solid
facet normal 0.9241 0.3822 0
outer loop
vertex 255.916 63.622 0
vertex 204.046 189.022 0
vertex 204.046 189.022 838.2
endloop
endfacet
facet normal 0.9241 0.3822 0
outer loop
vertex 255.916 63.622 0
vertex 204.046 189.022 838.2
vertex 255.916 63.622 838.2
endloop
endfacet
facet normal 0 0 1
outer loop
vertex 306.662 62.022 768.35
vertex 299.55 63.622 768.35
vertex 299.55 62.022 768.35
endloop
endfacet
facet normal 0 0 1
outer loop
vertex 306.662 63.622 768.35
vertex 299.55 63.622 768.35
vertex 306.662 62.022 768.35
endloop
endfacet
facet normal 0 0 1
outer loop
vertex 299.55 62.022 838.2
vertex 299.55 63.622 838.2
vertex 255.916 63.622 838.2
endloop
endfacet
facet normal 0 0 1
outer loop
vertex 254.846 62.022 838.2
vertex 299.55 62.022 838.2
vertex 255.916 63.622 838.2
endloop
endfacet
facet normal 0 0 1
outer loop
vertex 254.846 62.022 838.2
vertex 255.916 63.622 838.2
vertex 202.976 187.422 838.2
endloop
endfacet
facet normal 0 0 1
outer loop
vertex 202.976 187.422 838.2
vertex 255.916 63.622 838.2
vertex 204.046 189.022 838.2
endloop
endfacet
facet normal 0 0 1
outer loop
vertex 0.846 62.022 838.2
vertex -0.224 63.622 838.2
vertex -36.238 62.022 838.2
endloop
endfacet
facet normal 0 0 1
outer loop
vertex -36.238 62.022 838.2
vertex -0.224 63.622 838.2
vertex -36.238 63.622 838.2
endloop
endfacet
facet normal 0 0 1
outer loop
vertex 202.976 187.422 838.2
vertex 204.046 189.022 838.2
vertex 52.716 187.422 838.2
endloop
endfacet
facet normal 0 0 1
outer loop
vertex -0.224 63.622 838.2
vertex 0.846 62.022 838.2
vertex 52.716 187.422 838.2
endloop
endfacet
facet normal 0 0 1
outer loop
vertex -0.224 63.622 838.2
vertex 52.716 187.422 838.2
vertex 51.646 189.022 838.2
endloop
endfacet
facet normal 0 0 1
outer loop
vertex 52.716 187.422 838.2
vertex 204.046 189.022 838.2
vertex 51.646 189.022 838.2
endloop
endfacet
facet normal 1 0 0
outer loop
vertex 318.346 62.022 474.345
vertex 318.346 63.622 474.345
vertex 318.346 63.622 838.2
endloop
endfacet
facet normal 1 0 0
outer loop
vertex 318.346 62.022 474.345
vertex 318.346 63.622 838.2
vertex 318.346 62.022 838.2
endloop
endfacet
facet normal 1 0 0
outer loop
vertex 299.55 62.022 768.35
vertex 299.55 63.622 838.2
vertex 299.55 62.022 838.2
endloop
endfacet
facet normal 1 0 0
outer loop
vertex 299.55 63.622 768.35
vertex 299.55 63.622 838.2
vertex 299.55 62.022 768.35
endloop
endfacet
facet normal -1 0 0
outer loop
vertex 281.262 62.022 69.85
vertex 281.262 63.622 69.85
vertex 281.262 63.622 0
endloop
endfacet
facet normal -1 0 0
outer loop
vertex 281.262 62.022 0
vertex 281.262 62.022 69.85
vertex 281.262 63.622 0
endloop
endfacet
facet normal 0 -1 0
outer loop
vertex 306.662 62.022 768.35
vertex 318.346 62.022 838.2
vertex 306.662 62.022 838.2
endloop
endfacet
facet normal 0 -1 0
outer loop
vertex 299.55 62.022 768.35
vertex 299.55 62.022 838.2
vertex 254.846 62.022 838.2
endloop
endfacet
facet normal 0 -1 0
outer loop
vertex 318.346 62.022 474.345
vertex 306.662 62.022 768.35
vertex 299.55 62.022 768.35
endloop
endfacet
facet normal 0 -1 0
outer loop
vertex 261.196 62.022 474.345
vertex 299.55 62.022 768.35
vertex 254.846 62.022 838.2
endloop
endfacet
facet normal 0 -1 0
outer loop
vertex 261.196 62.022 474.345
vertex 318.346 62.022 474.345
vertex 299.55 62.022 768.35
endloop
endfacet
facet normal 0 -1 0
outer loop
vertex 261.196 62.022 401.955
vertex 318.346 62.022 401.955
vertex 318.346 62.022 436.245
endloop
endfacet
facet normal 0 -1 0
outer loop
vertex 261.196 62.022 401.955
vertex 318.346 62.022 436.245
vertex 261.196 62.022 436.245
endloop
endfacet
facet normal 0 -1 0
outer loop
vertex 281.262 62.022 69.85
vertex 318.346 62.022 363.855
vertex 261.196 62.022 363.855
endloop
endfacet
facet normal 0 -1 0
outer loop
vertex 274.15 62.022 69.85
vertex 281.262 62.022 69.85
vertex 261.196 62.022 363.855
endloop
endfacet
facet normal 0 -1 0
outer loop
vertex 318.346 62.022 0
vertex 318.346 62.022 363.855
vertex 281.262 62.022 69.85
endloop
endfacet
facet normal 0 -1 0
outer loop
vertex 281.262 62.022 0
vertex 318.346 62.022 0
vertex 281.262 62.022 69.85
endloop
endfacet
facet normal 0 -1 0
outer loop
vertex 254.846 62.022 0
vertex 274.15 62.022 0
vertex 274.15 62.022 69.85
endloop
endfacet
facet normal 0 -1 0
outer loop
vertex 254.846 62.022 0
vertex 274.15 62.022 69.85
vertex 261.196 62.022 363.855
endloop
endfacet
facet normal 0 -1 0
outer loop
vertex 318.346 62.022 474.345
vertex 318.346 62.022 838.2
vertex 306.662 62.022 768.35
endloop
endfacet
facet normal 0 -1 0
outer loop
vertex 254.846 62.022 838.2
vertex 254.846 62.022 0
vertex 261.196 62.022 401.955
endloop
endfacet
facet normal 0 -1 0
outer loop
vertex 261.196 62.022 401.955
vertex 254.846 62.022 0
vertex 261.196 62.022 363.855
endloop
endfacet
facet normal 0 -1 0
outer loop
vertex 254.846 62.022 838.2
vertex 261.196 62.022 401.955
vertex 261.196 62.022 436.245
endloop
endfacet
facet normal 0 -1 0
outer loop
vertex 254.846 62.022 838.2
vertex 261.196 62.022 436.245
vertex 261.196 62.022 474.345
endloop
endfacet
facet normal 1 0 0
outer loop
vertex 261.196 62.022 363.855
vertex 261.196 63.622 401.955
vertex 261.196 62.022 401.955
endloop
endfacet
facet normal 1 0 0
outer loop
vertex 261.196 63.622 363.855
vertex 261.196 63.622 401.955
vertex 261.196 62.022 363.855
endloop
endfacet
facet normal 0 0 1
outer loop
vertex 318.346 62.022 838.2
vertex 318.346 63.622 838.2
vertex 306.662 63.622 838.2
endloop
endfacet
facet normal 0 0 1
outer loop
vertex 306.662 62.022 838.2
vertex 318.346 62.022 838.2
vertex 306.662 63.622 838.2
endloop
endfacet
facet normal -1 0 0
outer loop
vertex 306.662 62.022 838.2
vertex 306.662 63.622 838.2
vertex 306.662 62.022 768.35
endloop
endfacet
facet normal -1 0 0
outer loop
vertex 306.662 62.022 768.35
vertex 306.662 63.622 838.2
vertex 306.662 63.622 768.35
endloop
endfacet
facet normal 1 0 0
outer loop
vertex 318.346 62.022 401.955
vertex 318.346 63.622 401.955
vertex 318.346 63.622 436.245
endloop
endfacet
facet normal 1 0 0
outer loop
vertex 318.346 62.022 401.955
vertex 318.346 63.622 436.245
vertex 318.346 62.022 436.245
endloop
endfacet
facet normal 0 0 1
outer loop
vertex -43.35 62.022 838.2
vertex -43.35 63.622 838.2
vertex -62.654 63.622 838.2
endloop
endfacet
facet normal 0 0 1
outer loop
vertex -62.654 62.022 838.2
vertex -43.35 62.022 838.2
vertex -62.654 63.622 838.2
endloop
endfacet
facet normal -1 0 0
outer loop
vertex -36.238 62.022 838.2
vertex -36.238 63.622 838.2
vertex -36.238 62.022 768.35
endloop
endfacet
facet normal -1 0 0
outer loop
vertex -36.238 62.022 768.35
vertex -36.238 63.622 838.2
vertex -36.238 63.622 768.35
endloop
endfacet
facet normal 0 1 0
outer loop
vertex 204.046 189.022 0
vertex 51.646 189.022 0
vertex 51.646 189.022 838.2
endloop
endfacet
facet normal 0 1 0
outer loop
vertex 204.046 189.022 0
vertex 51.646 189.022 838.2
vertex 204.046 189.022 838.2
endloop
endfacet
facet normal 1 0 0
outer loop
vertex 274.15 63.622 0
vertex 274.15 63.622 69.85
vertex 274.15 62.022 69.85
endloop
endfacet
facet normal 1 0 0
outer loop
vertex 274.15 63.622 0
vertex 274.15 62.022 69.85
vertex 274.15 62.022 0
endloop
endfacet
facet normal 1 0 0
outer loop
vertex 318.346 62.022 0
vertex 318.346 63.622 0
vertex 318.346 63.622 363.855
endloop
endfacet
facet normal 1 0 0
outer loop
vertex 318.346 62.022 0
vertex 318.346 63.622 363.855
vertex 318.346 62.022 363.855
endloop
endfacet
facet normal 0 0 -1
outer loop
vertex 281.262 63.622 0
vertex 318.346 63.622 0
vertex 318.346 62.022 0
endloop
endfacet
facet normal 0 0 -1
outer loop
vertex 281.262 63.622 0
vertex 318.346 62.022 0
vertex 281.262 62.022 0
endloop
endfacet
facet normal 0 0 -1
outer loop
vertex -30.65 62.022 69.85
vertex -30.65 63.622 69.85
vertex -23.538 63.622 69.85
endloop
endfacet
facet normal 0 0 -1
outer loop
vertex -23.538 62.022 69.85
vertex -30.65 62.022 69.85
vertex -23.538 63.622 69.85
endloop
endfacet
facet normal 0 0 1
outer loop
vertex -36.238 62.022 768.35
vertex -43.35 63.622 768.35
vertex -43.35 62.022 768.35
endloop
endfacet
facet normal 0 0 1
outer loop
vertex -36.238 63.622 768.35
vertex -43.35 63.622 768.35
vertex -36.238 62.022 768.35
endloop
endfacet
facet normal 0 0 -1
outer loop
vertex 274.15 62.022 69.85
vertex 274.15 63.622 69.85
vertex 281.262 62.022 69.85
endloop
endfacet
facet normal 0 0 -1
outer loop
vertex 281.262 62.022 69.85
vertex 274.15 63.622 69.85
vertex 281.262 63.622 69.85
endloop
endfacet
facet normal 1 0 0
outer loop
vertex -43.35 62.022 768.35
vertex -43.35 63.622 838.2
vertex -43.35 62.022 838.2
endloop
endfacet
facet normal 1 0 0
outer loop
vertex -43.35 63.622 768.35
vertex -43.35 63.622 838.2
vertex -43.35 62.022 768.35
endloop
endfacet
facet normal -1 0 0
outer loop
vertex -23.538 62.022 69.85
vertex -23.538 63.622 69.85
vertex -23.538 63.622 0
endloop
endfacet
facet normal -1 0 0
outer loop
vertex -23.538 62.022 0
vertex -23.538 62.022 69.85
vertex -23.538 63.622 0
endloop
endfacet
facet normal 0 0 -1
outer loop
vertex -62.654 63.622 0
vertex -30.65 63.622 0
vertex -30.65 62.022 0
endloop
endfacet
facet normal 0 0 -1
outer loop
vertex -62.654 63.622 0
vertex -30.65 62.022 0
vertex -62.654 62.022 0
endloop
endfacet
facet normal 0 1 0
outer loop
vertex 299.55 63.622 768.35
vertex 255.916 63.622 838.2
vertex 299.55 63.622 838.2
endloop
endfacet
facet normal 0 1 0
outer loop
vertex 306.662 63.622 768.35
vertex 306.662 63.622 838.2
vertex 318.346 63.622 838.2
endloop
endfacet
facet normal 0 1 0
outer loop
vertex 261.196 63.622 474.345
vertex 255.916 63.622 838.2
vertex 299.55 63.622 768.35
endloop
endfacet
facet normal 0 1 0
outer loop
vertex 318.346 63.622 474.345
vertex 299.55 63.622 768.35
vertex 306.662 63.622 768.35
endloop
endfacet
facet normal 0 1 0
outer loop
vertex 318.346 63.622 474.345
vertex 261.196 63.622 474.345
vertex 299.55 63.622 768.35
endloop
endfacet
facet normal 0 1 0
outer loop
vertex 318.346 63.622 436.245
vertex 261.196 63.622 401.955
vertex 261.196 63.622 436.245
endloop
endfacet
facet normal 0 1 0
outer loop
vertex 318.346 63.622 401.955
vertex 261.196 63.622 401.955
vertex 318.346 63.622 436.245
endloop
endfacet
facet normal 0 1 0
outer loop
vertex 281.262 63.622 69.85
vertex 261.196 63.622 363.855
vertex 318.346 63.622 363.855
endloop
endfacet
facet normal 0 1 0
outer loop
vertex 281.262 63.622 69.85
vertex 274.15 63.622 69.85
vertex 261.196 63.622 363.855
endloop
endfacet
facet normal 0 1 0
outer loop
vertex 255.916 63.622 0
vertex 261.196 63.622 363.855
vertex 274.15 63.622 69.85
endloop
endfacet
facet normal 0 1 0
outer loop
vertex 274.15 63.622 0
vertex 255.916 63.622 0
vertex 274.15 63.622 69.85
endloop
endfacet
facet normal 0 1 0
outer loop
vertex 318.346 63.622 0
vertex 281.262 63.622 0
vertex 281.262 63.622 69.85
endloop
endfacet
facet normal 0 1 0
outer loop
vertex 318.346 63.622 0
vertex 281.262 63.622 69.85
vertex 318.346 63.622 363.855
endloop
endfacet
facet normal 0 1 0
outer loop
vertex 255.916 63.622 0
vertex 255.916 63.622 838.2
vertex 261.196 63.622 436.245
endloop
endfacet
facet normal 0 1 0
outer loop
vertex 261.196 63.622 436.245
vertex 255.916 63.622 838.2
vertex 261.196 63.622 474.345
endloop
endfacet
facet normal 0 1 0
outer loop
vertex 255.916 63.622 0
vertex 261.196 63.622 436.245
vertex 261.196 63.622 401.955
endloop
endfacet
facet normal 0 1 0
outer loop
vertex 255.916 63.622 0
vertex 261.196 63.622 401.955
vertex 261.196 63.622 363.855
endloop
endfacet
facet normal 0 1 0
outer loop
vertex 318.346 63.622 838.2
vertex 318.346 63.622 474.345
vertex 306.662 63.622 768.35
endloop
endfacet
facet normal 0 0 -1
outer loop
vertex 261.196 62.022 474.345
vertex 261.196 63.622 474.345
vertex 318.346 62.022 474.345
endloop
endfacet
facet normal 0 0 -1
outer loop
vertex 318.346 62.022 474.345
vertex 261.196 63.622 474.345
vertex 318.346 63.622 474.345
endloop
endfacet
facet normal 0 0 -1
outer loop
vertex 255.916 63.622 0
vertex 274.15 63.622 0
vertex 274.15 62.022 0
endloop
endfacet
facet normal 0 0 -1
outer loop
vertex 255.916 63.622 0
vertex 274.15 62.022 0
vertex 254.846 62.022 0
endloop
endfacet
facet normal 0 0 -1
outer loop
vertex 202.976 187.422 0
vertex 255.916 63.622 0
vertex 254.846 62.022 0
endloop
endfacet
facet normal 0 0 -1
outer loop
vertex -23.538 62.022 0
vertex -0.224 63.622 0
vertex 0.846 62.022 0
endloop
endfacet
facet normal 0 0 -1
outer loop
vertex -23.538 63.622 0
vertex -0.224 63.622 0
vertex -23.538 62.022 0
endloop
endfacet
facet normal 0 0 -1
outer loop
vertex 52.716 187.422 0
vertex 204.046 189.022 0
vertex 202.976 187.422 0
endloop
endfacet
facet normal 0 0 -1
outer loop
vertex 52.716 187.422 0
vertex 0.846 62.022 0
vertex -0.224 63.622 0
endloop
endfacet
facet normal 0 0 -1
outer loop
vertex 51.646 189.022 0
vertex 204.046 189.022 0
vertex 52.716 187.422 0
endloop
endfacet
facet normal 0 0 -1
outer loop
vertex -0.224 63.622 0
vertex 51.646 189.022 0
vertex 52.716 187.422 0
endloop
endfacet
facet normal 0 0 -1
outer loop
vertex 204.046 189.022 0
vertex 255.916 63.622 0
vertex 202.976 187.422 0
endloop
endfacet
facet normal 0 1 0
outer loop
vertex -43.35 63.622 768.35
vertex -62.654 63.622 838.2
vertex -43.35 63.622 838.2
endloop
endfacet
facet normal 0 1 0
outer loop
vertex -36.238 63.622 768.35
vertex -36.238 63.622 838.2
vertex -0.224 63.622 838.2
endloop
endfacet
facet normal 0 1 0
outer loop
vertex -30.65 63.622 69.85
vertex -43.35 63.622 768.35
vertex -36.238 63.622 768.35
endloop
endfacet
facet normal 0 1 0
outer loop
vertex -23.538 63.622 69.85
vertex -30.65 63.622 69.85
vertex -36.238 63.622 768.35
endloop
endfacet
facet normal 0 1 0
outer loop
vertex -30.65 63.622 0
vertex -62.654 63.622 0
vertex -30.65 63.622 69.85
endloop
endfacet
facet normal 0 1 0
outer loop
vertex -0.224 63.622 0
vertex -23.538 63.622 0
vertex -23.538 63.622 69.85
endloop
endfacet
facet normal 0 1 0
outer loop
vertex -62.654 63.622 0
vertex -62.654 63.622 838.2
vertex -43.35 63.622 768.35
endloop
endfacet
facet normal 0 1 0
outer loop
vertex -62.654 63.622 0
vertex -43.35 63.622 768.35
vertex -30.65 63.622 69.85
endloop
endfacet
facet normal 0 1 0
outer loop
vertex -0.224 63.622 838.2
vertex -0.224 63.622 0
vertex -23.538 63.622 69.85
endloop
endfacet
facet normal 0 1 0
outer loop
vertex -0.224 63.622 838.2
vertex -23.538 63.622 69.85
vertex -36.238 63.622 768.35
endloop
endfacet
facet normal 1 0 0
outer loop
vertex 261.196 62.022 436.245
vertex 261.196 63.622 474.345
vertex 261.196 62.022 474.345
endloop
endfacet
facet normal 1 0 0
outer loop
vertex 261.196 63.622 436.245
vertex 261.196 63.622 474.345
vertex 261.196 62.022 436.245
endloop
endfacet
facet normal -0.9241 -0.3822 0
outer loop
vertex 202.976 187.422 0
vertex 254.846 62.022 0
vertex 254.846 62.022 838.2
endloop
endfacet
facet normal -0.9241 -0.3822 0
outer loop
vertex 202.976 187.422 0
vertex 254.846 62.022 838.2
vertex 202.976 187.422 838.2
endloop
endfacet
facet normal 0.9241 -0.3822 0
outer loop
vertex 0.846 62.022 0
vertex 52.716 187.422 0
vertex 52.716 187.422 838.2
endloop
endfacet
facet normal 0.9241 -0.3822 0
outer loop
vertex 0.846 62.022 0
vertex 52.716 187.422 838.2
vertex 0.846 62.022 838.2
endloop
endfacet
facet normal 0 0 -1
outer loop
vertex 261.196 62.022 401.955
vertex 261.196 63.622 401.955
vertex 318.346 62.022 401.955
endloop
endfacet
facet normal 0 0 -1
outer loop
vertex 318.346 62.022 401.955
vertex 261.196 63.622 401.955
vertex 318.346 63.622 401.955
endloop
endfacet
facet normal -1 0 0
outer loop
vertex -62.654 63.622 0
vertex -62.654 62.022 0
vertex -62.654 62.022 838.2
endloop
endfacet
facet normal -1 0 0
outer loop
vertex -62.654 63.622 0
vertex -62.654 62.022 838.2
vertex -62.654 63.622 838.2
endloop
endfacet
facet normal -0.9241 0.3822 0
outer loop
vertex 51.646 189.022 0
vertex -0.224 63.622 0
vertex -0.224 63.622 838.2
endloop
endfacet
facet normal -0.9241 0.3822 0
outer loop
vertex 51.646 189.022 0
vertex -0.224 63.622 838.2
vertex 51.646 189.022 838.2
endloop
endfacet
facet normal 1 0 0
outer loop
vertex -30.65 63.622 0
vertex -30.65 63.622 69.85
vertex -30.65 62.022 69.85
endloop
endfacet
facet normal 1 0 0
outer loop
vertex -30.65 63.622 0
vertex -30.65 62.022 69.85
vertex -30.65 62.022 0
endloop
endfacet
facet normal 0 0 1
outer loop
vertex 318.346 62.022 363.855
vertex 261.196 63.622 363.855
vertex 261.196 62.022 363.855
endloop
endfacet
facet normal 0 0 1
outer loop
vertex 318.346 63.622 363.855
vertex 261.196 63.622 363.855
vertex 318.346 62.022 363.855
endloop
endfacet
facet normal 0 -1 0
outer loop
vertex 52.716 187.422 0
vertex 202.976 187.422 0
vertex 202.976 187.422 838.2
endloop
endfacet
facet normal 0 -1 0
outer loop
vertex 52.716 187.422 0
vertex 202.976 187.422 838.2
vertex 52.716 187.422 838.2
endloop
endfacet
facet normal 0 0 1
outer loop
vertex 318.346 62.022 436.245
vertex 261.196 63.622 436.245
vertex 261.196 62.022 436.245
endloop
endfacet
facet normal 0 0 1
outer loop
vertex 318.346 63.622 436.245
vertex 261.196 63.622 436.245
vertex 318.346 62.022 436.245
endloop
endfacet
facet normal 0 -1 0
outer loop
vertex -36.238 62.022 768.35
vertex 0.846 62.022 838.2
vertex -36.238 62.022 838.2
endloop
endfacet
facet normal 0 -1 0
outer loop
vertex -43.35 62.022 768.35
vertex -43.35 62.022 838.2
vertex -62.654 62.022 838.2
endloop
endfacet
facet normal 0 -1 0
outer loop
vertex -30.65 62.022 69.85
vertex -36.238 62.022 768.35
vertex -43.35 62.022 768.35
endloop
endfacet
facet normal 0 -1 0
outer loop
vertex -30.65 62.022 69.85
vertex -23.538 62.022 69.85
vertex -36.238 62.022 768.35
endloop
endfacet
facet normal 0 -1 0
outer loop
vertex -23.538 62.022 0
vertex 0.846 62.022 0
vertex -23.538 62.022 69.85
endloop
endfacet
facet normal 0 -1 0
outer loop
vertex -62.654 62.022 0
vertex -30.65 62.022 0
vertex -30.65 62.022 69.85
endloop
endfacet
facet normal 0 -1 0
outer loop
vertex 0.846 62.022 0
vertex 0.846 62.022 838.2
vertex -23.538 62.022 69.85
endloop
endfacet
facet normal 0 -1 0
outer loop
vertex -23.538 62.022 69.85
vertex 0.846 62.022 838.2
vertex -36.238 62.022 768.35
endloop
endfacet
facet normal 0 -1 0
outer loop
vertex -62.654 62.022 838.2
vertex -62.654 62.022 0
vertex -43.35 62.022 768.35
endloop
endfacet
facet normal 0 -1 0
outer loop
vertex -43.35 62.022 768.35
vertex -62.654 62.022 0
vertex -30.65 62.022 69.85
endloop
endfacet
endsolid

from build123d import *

# Parameters (mm, degrees)
BOSS_EXTRUDE1_DEPTH = 838.2
SKETCH4_W           = 57.15
SKETCH4_H           = 38.1
CUT_EXTRUDE3_DEPTH  = 2.54
SKETCH5_W           = 7.112
SKETCH5_H           = 69.85
CUT_EXTRUDE4_DEPTH  = 2.6002


with BuildPart() as part:
    # Sketch1 → Boss-Extrude1 (new body)
    with BuildSketch(Plane.XY):
        Polygon((-0.223728527, 63.622161409), (51.646062311, 189.021961409), (204.046062311, 189.021961409), (255.915853149, 63.622161409), (318.346062311, 63.622161409), (318.346062311, 62.021961409), (254.846062311, 62.021961409), (202.976271473, 187.421761409), (52.715853149, 187.421761409), (0.846062311, 62.021961409), (-62.653937689, 62.021961409), (-62.653937689, 63.622161409), align=None)
    extrude(amount=BOSS_EXTRUDE1_DEPTH)

    # Sketch4 → Cut-Extrude3 (cut)
    with BuildSketch(Plane(origin=(0, 63.622161409, 0), x_dir=(1, 0, 0), z_dir=(0, 1, 0))):
        with Locations((289.771062311, -382.905)):
            Rectangle(SKETCH4_W, SKETCH4_H)
        with Locations((289.771062311, -455.295)):
            Rectangle(SKETCH4_W, SKETCH4_H)
    extrude(amount=-CUT_EXTRUDE3_DEPTH, mode=Mode.SUBTRACT)

    # Sketch5 → Cut-Extrude4 (cut, through all)
    with BuildSketch(Plane(origin=(0, 63.622161409, 0), x_dir=(1, 0, 0), z_dir=(0, 1, 0))):
        with Locations((-27.093937689, -34.925)):
            Rectangle(SKETCH5_W, SKETCH5_H)
        with Locations((-39.793937689, -803.275)):
            Rectangle(SKETCH5_W, SKETCH5_H)
        with Locations((277.706062311, -34.925)):
            Rectangle(SKETCH5_W, SKETCH5_H)
        with Locations((303.106062311, -803.275)):
            Rectangle(SKETCH5_W, SKETCH5_H)
    extrude(amount=-CUT_EXTRUDE4_DEPTH, mode=Mode.SUBTRACT)


solid = part.part
